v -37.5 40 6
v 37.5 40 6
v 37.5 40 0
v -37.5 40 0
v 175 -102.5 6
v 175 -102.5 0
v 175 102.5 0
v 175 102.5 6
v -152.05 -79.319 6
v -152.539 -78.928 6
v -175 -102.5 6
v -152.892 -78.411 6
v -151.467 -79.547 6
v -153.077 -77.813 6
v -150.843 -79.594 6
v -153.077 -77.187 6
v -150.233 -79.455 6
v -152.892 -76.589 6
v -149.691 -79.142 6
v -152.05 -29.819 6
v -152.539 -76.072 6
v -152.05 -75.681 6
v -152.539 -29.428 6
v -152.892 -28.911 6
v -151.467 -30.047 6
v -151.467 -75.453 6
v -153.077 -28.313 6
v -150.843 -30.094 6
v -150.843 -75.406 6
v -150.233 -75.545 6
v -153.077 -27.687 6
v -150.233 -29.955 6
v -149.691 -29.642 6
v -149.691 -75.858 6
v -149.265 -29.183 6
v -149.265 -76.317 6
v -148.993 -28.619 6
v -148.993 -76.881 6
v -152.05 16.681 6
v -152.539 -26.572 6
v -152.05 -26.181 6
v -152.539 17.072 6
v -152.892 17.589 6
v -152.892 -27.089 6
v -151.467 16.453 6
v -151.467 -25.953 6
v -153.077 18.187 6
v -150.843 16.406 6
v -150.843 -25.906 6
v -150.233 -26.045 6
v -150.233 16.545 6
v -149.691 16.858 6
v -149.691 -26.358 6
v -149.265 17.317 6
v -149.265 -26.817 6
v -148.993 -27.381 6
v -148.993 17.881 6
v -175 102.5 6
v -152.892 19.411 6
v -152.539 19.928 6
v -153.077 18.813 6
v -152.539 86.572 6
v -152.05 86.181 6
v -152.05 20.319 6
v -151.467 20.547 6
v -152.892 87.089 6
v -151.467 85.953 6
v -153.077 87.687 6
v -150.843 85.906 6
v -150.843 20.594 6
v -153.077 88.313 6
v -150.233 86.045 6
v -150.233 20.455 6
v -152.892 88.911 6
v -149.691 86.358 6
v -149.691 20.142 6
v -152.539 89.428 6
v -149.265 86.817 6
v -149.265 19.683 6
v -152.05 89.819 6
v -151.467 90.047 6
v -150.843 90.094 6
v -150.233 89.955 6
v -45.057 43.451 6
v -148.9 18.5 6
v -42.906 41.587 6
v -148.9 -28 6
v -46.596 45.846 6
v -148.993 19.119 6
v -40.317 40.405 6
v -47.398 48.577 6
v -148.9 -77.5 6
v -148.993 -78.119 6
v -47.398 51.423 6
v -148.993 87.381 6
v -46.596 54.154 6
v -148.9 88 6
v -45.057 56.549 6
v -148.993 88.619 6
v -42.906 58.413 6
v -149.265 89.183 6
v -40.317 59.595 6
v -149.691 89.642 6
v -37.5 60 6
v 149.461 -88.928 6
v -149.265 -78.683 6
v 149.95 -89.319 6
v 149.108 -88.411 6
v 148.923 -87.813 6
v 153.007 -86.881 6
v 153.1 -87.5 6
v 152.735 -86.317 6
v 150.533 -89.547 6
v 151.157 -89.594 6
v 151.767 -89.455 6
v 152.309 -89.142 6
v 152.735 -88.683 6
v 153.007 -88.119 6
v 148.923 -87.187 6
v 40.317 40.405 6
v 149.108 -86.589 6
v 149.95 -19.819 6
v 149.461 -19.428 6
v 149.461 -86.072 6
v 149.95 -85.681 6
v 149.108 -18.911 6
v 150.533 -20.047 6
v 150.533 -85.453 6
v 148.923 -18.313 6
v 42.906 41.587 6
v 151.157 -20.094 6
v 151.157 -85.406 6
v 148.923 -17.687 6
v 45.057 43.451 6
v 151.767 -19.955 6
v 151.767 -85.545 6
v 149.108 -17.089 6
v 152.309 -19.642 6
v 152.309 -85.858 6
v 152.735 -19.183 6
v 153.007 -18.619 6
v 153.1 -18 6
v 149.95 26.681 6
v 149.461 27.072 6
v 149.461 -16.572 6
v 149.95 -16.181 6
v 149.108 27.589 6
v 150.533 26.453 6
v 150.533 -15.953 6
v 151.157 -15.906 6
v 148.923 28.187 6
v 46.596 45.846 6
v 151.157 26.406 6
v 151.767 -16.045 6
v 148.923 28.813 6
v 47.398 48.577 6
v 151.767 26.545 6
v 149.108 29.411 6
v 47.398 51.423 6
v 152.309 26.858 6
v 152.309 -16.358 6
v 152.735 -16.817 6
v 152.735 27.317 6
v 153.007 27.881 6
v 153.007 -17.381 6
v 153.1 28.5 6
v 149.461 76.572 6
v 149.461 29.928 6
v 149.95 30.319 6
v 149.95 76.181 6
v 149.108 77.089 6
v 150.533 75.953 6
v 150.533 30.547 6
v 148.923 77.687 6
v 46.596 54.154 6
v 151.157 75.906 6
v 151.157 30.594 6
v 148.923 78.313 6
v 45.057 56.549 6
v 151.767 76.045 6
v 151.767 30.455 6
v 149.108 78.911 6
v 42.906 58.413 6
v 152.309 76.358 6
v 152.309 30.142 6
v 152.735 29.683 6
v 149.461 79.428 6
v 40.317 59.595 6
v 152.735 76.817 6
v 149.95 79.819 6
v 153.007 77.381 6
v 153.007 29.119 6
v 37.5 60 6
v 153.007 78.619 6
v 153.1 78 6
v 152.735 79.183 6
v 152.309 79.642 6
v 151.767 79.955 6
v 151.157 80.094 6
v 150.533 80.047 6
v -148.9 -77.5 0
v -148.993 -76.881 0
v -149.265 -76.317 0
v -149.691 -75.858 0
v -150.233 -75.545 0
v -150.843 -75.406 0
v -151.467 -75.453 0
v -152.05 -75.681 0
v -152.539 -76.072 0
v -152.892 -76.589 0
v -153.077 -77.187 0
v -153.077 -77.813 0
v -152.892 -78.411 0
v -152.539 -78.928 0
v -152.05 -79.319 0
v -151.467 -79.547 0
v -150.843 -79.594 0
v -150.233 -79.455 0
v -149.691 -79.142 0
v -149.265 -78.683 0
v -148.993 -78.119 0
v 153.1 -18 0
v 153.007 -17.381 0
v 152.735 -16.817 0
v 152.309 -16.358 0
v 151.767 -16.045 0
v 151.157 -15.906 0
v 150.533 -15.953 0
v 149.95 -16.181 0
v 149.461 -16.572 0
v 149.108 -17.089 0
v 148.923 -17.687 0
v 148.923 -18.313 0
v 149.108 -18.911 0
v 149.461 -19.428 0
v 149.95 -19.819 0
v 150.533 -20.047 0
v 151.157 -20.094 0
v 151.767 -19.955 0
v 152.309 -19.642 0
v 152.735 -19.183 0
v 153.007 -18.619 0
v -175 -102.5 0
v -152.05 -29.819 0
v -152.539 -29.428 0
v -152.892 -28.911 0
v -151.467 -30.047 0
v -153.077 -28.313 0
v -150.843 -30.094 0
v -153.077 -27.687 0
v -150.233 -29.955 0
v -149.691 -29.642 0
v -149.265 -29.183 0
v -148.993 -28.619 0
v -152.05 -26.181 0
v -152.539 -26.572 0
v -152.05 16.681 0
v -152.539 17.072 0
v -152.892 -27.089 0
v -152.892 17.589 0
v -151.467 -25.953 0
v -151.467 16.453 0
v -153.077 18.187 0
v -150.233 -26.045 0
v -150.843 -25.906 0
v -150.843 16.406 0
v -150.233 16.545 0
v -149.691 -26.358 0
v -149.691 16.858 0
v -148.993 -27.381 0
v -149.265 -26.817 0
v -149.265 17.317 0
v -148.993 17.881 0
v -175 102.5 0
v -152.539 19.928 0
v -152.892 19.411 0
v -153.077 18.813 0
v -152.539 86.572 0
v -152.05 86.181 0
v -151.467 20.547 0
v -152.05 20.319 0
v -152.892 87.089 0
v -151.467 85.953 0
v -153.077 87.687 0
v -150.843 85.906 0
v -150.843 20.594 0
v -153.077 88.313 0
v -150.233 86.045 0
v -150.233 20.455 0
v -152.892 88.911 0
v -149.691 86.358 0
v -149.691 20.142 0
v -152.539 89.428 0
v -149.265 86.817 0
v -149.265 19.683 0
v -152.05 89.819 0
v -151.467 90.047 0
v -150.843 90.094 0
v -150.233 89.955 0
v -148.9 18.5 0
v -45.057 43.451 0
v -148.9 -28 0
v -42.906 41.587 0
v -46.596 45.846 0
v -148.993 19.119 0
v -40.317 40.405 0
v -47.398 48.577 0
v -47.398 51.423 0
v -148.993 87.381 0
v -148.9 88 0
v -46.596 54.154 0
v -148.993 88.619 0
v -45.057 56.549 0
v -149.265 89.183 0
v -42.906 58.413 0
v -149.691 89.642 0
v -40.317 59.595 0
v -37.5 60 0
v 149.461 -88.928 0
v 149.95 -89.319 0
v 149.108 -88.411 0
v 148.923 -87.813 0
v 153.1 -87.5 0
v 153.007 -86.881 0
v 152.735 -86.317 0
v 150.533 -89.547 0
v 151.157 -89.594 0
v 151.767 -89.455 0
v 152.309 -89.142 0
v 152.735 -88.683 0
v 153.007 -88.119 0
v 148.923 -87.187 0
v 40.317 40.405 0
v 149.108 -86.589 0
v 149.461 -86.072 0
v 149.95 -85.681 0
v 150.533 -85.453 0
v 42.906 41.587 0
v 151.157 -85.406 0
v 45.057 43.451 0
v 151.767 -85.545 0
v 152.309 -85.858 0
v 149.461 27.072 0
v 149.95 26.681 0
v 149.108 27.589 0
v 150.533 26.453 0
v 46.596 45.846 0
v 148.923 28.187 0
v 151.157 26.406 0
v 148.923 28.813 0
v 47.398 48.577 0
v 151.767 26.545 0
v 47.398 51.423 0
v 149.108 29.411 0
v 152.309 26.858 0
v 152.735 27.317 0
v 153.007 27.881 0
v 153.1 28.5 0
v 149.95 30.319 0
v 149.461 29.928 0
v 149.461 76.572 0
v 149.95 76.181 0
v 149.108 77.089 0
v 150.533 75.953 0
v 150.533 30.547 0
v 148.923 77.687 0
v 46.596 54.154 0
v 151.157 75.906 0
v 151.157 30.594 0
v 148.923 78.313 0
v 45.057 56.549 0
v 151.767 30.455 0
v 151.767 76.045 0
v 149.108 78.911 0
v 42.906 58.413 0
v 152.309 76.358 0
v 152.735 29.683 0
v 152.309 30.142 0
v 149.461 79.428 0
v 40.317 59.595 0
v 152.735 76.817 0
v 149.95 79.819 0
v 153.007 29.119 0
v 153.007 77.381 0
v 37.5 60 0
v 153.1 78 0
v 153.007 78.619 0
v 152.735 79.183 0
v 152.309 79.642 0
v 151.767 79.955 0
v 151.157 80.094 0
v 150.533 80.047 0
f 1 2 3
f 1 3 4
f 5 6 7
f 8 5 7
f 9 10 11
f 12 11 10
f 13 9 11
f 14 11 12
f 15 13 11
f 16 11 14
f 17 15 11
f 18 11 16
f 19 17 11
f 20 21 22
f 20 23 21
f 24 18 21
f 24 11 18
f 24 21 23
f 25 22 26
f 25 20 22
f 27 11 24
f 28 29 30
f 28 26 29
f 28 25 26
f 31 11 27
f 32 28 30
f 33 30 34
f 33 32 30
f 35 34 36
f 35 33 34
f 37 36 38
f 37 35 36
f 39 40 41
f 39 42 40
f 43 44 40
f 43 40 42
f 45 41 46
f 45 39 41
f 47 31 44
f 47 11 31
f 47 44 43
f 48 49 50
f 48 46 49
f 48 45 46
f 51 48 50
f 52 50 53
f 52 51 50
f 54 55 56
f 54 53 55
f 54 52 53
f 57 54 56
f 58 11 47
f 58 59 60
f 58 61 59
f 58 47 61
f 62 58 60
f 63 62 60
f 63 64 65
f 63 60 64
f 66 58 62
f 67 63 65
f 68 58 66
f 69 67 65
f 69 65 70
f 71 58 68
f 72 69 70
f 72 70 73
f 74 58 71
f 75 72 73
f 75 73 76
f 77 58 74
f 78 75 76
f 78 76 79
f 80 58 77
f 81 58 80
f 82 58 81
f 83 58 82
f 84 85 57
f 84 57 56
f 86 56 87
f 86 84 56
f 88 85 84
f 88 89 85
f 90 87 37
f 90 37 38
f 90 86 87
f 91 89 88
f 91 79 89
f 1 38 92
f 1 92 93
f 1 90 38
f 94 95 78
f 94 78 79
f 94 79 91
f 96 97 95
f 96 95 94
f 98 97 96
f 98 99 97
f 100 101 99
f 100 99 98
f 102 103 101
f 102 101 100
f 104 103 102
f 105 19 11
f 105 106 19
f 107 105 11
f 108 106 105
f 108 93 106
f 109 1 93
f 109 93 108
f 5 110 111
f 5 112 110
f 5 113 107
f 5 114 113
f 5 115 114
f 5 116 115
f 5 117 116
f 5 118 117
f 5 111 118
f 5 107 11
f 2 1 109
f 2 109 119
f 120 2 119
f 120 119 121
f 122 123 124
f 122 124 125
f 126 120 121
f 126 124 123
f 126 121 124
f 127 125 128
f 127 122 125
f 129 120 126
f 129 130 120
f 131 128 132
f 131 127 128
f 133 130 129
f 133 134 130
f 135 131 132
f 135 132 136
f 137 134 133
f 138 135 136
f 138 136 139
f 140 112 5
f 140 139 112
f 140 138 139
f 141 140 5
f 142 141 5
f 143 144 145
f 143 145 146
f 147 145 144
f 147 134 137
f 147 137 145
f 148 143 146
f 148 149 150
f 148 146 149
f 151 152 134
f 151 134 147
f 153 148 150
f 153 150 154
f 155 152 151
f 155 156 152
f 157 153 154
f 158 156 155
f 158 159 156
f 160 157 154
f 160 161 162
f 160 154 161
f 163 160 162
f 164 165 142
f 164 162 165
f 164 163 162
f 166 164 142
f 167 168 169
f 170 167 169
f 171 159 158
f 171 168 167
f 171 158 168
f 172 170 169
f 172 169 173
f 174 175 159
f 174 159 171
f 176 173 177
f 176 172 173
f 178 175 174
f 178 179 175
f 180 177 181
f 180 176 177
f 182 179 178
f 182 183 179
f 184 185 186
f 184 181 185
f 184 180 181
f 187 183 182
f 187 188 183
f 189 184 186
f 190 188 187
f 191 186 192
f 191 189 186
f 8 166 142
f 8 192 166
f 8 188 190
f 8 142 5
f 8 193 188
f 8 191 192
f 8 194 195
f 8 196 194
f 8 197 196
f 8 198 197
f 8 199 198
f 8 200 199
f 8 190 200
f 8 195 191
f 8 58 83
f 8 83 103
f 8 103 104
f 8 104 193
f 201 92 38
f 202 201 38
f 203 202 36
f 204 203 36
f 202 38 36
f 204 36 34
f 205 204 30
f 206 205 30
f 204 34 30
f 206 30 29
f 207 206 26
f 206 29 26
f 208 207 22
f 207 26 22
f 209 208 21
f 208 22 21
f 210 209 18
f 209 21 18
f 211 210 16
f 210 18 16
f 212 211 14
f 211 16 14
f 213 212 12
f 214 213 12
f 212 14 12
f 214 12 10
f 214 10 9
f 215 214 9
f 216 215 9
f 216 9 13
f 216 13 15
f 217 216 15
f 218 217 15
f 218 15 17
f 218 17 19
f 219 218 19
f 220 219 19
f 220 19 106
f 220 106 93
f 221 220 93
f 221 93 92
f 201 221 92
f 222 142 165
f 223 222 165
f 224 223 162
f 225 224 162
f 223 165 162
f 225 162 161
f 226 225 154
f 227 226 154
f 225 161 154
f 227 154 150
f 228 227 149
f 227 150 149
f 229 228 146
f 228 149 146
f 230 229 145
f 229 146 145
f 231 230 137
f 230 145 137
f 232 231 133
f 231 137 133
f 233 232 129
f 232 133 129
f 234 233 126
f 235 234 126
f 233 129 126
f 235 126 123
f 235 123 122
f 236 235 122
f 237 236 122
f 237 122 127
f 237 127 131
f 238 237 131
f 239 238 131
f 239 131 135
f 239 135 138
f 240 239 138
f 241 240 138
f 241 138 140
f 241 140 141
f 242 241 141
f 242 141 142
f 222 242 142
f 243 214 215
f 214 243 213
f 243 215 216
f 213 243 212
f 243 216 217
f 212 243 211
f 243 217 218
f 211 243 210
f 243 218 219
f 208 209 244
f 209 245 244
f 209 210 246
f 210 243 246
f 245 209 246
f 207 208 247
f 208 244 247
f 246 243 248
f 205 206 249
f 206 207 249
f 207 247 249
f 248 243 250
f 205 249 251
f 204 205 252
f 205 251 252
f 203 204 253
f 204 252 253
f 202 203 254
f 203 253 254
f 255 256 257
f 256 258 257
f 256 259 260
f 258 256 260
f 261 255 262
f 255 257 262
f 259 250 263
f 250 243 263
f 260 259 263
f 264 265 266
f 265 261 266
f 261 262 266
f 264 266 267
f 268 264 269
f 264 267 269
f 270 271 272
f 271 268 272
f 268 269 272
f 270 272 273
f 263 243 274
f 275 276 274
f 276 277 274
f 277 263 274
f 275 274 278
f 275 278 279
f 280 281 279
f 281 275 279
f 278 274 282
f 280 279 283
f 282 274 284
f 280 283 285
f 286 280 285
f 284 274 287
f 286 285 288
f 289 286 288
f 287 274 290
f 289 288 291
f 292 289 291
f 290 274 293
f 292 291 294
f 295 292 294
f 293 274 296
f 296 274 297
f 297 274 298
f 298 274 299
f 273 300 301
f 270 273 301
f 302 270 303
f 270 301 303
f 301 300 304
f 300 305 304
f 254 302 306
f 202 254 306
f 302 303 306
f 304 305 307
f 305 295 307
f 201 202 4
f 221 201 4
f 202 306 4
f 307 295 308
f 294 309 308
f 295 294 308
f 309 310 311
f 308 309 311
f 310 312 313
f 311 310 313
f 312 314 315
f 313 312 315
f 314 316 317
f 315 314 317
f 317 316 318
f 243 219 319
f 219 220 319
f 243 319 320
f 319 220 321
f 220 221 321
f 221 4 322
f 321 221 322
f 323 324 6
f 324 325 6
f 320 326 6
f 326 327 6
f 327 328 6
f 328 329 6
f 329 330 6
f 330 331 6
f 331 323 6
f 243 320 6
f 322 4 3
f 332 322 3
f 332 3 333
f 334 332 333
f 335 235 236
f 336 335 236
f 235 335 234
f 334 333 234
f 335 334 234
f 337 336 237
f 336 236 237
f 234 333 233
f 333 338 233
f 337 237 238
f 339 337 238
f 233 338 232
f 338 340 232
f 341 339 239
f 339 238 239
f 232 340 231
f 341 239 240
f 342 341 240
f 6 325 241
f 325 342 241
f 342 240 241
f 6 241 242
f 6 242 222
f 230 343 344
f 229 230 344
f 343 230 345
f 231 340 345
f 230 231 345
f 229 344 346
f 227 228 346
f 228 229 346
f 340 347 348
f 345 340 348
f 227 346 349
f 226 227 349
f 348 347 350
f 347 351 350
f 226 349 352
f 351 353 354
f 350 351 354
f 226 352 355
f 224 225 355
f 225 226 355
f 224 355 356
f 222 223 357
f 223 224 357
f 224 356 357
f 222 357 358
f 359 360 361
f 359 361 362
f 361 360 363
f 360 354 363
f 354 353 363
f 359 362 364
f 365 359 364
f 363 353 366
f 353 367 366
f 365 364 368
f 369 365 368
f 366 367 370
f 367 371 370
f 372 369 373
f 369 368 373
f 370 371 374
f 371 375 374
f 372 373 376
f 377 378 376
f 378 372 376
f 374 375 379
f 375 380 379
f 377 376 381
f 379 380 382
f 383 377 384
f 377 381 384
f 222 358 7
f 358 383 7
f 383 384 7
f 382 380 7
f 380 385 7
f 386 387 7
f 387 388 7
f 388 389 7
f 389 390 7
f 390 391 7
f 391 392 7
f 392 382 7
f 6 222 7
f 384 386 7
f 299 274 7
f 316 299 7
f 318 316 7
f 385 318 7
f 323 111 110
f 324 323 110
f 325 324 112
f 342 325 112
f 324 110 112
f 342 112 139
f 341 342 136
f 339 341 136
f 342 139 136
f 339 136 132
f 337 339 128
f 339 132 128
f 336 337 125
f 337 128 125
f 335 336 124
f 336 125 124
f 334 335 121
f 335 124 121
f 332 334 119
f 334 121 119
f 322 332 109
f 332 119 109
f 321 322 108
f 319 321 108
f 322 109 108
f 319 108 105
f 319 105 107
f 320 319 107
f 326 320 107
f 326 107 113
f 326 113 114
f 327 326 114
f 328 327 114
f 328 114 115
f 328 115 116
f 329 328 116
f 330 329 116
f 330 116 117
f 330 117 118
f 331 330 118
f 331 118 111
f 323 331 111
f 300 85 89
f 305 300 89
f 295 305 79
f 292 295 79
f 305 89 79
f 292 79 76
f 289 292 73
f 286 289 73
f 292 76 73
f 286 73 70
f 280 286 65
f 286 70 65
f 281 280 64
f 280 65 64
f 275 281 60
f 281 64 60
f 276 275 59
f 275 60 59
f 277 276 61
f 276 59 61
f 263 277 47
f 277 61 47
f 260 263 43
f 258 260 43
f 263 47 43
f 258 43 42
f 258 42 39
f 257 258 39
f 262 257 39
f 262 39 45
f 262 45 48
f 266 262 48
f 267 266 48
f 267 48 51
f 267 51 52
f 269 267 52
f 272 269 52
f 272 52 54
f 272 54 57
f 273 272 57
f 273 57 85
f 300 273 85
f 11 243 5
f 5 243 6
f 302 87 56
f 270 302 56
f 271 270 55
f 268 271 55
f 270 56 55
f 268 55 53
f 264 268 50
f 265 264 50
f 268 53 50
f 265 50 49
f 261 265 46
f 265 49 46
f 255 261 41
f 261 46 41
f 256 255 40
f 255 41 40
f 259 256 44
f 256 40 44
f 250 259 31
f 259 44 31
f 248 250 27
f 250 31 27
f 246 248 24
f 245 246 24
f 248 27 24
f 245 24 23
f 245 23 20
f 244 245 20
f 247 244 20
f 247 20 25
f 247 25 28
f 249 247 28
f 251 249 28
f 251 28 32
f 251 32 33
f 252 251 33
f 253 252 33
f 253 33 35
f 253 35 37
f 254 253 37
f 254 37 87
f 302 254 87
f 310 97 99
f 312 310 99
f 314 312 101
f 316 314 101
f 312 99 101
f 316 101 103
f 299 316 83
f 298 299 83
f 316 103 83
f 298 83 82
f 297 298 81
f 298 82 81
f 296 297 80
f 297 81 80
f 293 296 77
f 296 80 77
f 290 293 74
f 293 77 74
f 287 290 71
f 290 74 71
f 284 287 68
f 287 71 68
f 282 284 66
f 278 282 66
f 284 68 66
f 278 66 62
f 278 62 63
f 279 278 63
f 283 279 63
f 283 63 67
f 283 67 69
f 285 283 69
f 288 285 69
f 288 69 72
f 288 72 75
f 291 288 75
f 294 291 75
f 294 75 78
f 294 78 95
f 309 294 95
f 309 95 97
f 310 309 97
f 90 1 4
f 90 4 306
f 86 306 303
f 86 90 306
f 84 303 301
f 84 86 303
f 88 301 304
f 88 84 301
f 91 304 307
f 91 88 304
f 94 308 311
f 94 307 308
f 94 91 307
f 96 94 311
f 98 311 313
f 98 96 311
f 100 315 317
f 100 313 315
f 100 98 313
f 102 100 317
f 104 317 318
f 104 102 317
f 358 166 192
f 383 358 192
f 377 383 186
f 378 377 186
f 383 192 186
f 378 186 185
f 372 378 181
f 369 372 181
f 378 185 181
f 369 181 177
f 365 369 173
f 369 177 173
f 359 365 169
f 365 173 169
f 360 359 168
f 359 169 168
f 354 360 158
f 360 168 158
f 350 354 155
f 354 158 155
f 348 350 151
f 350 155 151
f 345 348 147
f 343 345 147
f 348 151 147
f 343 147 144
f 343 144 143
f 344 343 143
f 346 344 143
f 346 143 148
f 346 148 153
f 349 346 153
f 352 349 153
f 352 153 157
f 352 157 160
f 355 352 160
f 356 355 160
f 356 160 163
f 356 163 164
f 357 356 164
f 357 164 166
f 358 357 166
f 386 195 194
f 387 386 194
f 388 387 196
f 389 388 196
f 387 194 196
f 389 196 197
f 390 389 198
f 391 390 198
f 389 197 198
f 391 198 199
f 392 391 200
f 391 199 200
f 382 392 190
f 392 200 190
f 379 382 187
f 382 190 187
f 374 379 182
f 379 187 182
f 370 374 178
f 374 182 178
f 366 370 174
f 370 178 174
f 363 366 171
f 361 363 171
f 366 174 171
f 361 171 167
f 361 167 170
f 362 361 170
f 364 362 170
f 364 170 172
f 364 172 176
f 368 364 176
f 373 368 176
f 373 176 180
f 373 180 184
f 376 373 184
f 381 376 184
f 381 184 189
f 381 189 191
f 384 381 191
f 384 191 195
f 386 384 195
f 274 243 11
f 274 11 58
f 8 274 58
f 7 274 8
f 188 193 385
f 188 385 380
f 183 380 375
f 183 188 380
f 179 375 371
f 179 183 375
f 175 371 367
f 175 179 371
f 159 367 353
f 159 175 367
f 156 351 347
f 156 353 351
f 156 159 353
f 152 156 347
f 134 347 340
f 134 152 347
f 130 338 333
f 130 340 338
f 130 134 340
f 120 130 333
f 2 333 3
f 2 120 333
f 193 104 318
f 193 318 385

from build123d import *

# Parameters (mm, degrees)
ESBO_O1_W                    = 350
ESBO_O1_H                    = 205
RESSALTO_EXTRUS_O1_DEPTH     = 6
CORTE_EXTRUS_O1_DEPTH        = 203.897141429
FURO_DE_DI_METRO_4_2_4_2_1_D = 4.2


with BuildPart() as part:
    # Esboço1 → Ressalto-extrusão1 (new body)
    with BuildSketch(Plane.XY):
        Rectangle(ESBO_O1_W, ESBO_O1_H)
    extrude(amount=RESSALTO_EXTRUS_O1_DEPTH)

    # Esboço2 → Corte-extrusão1 (cut, through all)
    with BuildSketch(Plane.XY.offset(6)):
        with BuildLine():
            Line((-37.5, 60), (37.5, 60))
            ThreePointArc((37.5, 60), (47.5, 50), (37.5, 40))
            Line((37.5, 40), (-37.5, 40))
            ThreePointArc((-37.5, 40), (-47.5, 50), (-37.5, 60))
        make_face()
    extrude(amount=-CORTE_EXTRUS_O1_DEPTH, mode=Mode.SUBTRACT)

    # Furo de diâmetro Ø4.2 (4.2)1 (through all)
    with Locations(Plane(origin=(0, 0, 0), x_dir=(-1, 0, 0), z_dir=(0, 0, -1))):
        with Locations((-151, -87.5), (-151, -18), (-151, 28.5), (-151, 78), (151, -77.5), (151, -28), (151, 18.5), (151, 88)):
            Hole(FURO_DE_DI_METRO_4_2_4_2_1_D / 2)


solid = part.part
